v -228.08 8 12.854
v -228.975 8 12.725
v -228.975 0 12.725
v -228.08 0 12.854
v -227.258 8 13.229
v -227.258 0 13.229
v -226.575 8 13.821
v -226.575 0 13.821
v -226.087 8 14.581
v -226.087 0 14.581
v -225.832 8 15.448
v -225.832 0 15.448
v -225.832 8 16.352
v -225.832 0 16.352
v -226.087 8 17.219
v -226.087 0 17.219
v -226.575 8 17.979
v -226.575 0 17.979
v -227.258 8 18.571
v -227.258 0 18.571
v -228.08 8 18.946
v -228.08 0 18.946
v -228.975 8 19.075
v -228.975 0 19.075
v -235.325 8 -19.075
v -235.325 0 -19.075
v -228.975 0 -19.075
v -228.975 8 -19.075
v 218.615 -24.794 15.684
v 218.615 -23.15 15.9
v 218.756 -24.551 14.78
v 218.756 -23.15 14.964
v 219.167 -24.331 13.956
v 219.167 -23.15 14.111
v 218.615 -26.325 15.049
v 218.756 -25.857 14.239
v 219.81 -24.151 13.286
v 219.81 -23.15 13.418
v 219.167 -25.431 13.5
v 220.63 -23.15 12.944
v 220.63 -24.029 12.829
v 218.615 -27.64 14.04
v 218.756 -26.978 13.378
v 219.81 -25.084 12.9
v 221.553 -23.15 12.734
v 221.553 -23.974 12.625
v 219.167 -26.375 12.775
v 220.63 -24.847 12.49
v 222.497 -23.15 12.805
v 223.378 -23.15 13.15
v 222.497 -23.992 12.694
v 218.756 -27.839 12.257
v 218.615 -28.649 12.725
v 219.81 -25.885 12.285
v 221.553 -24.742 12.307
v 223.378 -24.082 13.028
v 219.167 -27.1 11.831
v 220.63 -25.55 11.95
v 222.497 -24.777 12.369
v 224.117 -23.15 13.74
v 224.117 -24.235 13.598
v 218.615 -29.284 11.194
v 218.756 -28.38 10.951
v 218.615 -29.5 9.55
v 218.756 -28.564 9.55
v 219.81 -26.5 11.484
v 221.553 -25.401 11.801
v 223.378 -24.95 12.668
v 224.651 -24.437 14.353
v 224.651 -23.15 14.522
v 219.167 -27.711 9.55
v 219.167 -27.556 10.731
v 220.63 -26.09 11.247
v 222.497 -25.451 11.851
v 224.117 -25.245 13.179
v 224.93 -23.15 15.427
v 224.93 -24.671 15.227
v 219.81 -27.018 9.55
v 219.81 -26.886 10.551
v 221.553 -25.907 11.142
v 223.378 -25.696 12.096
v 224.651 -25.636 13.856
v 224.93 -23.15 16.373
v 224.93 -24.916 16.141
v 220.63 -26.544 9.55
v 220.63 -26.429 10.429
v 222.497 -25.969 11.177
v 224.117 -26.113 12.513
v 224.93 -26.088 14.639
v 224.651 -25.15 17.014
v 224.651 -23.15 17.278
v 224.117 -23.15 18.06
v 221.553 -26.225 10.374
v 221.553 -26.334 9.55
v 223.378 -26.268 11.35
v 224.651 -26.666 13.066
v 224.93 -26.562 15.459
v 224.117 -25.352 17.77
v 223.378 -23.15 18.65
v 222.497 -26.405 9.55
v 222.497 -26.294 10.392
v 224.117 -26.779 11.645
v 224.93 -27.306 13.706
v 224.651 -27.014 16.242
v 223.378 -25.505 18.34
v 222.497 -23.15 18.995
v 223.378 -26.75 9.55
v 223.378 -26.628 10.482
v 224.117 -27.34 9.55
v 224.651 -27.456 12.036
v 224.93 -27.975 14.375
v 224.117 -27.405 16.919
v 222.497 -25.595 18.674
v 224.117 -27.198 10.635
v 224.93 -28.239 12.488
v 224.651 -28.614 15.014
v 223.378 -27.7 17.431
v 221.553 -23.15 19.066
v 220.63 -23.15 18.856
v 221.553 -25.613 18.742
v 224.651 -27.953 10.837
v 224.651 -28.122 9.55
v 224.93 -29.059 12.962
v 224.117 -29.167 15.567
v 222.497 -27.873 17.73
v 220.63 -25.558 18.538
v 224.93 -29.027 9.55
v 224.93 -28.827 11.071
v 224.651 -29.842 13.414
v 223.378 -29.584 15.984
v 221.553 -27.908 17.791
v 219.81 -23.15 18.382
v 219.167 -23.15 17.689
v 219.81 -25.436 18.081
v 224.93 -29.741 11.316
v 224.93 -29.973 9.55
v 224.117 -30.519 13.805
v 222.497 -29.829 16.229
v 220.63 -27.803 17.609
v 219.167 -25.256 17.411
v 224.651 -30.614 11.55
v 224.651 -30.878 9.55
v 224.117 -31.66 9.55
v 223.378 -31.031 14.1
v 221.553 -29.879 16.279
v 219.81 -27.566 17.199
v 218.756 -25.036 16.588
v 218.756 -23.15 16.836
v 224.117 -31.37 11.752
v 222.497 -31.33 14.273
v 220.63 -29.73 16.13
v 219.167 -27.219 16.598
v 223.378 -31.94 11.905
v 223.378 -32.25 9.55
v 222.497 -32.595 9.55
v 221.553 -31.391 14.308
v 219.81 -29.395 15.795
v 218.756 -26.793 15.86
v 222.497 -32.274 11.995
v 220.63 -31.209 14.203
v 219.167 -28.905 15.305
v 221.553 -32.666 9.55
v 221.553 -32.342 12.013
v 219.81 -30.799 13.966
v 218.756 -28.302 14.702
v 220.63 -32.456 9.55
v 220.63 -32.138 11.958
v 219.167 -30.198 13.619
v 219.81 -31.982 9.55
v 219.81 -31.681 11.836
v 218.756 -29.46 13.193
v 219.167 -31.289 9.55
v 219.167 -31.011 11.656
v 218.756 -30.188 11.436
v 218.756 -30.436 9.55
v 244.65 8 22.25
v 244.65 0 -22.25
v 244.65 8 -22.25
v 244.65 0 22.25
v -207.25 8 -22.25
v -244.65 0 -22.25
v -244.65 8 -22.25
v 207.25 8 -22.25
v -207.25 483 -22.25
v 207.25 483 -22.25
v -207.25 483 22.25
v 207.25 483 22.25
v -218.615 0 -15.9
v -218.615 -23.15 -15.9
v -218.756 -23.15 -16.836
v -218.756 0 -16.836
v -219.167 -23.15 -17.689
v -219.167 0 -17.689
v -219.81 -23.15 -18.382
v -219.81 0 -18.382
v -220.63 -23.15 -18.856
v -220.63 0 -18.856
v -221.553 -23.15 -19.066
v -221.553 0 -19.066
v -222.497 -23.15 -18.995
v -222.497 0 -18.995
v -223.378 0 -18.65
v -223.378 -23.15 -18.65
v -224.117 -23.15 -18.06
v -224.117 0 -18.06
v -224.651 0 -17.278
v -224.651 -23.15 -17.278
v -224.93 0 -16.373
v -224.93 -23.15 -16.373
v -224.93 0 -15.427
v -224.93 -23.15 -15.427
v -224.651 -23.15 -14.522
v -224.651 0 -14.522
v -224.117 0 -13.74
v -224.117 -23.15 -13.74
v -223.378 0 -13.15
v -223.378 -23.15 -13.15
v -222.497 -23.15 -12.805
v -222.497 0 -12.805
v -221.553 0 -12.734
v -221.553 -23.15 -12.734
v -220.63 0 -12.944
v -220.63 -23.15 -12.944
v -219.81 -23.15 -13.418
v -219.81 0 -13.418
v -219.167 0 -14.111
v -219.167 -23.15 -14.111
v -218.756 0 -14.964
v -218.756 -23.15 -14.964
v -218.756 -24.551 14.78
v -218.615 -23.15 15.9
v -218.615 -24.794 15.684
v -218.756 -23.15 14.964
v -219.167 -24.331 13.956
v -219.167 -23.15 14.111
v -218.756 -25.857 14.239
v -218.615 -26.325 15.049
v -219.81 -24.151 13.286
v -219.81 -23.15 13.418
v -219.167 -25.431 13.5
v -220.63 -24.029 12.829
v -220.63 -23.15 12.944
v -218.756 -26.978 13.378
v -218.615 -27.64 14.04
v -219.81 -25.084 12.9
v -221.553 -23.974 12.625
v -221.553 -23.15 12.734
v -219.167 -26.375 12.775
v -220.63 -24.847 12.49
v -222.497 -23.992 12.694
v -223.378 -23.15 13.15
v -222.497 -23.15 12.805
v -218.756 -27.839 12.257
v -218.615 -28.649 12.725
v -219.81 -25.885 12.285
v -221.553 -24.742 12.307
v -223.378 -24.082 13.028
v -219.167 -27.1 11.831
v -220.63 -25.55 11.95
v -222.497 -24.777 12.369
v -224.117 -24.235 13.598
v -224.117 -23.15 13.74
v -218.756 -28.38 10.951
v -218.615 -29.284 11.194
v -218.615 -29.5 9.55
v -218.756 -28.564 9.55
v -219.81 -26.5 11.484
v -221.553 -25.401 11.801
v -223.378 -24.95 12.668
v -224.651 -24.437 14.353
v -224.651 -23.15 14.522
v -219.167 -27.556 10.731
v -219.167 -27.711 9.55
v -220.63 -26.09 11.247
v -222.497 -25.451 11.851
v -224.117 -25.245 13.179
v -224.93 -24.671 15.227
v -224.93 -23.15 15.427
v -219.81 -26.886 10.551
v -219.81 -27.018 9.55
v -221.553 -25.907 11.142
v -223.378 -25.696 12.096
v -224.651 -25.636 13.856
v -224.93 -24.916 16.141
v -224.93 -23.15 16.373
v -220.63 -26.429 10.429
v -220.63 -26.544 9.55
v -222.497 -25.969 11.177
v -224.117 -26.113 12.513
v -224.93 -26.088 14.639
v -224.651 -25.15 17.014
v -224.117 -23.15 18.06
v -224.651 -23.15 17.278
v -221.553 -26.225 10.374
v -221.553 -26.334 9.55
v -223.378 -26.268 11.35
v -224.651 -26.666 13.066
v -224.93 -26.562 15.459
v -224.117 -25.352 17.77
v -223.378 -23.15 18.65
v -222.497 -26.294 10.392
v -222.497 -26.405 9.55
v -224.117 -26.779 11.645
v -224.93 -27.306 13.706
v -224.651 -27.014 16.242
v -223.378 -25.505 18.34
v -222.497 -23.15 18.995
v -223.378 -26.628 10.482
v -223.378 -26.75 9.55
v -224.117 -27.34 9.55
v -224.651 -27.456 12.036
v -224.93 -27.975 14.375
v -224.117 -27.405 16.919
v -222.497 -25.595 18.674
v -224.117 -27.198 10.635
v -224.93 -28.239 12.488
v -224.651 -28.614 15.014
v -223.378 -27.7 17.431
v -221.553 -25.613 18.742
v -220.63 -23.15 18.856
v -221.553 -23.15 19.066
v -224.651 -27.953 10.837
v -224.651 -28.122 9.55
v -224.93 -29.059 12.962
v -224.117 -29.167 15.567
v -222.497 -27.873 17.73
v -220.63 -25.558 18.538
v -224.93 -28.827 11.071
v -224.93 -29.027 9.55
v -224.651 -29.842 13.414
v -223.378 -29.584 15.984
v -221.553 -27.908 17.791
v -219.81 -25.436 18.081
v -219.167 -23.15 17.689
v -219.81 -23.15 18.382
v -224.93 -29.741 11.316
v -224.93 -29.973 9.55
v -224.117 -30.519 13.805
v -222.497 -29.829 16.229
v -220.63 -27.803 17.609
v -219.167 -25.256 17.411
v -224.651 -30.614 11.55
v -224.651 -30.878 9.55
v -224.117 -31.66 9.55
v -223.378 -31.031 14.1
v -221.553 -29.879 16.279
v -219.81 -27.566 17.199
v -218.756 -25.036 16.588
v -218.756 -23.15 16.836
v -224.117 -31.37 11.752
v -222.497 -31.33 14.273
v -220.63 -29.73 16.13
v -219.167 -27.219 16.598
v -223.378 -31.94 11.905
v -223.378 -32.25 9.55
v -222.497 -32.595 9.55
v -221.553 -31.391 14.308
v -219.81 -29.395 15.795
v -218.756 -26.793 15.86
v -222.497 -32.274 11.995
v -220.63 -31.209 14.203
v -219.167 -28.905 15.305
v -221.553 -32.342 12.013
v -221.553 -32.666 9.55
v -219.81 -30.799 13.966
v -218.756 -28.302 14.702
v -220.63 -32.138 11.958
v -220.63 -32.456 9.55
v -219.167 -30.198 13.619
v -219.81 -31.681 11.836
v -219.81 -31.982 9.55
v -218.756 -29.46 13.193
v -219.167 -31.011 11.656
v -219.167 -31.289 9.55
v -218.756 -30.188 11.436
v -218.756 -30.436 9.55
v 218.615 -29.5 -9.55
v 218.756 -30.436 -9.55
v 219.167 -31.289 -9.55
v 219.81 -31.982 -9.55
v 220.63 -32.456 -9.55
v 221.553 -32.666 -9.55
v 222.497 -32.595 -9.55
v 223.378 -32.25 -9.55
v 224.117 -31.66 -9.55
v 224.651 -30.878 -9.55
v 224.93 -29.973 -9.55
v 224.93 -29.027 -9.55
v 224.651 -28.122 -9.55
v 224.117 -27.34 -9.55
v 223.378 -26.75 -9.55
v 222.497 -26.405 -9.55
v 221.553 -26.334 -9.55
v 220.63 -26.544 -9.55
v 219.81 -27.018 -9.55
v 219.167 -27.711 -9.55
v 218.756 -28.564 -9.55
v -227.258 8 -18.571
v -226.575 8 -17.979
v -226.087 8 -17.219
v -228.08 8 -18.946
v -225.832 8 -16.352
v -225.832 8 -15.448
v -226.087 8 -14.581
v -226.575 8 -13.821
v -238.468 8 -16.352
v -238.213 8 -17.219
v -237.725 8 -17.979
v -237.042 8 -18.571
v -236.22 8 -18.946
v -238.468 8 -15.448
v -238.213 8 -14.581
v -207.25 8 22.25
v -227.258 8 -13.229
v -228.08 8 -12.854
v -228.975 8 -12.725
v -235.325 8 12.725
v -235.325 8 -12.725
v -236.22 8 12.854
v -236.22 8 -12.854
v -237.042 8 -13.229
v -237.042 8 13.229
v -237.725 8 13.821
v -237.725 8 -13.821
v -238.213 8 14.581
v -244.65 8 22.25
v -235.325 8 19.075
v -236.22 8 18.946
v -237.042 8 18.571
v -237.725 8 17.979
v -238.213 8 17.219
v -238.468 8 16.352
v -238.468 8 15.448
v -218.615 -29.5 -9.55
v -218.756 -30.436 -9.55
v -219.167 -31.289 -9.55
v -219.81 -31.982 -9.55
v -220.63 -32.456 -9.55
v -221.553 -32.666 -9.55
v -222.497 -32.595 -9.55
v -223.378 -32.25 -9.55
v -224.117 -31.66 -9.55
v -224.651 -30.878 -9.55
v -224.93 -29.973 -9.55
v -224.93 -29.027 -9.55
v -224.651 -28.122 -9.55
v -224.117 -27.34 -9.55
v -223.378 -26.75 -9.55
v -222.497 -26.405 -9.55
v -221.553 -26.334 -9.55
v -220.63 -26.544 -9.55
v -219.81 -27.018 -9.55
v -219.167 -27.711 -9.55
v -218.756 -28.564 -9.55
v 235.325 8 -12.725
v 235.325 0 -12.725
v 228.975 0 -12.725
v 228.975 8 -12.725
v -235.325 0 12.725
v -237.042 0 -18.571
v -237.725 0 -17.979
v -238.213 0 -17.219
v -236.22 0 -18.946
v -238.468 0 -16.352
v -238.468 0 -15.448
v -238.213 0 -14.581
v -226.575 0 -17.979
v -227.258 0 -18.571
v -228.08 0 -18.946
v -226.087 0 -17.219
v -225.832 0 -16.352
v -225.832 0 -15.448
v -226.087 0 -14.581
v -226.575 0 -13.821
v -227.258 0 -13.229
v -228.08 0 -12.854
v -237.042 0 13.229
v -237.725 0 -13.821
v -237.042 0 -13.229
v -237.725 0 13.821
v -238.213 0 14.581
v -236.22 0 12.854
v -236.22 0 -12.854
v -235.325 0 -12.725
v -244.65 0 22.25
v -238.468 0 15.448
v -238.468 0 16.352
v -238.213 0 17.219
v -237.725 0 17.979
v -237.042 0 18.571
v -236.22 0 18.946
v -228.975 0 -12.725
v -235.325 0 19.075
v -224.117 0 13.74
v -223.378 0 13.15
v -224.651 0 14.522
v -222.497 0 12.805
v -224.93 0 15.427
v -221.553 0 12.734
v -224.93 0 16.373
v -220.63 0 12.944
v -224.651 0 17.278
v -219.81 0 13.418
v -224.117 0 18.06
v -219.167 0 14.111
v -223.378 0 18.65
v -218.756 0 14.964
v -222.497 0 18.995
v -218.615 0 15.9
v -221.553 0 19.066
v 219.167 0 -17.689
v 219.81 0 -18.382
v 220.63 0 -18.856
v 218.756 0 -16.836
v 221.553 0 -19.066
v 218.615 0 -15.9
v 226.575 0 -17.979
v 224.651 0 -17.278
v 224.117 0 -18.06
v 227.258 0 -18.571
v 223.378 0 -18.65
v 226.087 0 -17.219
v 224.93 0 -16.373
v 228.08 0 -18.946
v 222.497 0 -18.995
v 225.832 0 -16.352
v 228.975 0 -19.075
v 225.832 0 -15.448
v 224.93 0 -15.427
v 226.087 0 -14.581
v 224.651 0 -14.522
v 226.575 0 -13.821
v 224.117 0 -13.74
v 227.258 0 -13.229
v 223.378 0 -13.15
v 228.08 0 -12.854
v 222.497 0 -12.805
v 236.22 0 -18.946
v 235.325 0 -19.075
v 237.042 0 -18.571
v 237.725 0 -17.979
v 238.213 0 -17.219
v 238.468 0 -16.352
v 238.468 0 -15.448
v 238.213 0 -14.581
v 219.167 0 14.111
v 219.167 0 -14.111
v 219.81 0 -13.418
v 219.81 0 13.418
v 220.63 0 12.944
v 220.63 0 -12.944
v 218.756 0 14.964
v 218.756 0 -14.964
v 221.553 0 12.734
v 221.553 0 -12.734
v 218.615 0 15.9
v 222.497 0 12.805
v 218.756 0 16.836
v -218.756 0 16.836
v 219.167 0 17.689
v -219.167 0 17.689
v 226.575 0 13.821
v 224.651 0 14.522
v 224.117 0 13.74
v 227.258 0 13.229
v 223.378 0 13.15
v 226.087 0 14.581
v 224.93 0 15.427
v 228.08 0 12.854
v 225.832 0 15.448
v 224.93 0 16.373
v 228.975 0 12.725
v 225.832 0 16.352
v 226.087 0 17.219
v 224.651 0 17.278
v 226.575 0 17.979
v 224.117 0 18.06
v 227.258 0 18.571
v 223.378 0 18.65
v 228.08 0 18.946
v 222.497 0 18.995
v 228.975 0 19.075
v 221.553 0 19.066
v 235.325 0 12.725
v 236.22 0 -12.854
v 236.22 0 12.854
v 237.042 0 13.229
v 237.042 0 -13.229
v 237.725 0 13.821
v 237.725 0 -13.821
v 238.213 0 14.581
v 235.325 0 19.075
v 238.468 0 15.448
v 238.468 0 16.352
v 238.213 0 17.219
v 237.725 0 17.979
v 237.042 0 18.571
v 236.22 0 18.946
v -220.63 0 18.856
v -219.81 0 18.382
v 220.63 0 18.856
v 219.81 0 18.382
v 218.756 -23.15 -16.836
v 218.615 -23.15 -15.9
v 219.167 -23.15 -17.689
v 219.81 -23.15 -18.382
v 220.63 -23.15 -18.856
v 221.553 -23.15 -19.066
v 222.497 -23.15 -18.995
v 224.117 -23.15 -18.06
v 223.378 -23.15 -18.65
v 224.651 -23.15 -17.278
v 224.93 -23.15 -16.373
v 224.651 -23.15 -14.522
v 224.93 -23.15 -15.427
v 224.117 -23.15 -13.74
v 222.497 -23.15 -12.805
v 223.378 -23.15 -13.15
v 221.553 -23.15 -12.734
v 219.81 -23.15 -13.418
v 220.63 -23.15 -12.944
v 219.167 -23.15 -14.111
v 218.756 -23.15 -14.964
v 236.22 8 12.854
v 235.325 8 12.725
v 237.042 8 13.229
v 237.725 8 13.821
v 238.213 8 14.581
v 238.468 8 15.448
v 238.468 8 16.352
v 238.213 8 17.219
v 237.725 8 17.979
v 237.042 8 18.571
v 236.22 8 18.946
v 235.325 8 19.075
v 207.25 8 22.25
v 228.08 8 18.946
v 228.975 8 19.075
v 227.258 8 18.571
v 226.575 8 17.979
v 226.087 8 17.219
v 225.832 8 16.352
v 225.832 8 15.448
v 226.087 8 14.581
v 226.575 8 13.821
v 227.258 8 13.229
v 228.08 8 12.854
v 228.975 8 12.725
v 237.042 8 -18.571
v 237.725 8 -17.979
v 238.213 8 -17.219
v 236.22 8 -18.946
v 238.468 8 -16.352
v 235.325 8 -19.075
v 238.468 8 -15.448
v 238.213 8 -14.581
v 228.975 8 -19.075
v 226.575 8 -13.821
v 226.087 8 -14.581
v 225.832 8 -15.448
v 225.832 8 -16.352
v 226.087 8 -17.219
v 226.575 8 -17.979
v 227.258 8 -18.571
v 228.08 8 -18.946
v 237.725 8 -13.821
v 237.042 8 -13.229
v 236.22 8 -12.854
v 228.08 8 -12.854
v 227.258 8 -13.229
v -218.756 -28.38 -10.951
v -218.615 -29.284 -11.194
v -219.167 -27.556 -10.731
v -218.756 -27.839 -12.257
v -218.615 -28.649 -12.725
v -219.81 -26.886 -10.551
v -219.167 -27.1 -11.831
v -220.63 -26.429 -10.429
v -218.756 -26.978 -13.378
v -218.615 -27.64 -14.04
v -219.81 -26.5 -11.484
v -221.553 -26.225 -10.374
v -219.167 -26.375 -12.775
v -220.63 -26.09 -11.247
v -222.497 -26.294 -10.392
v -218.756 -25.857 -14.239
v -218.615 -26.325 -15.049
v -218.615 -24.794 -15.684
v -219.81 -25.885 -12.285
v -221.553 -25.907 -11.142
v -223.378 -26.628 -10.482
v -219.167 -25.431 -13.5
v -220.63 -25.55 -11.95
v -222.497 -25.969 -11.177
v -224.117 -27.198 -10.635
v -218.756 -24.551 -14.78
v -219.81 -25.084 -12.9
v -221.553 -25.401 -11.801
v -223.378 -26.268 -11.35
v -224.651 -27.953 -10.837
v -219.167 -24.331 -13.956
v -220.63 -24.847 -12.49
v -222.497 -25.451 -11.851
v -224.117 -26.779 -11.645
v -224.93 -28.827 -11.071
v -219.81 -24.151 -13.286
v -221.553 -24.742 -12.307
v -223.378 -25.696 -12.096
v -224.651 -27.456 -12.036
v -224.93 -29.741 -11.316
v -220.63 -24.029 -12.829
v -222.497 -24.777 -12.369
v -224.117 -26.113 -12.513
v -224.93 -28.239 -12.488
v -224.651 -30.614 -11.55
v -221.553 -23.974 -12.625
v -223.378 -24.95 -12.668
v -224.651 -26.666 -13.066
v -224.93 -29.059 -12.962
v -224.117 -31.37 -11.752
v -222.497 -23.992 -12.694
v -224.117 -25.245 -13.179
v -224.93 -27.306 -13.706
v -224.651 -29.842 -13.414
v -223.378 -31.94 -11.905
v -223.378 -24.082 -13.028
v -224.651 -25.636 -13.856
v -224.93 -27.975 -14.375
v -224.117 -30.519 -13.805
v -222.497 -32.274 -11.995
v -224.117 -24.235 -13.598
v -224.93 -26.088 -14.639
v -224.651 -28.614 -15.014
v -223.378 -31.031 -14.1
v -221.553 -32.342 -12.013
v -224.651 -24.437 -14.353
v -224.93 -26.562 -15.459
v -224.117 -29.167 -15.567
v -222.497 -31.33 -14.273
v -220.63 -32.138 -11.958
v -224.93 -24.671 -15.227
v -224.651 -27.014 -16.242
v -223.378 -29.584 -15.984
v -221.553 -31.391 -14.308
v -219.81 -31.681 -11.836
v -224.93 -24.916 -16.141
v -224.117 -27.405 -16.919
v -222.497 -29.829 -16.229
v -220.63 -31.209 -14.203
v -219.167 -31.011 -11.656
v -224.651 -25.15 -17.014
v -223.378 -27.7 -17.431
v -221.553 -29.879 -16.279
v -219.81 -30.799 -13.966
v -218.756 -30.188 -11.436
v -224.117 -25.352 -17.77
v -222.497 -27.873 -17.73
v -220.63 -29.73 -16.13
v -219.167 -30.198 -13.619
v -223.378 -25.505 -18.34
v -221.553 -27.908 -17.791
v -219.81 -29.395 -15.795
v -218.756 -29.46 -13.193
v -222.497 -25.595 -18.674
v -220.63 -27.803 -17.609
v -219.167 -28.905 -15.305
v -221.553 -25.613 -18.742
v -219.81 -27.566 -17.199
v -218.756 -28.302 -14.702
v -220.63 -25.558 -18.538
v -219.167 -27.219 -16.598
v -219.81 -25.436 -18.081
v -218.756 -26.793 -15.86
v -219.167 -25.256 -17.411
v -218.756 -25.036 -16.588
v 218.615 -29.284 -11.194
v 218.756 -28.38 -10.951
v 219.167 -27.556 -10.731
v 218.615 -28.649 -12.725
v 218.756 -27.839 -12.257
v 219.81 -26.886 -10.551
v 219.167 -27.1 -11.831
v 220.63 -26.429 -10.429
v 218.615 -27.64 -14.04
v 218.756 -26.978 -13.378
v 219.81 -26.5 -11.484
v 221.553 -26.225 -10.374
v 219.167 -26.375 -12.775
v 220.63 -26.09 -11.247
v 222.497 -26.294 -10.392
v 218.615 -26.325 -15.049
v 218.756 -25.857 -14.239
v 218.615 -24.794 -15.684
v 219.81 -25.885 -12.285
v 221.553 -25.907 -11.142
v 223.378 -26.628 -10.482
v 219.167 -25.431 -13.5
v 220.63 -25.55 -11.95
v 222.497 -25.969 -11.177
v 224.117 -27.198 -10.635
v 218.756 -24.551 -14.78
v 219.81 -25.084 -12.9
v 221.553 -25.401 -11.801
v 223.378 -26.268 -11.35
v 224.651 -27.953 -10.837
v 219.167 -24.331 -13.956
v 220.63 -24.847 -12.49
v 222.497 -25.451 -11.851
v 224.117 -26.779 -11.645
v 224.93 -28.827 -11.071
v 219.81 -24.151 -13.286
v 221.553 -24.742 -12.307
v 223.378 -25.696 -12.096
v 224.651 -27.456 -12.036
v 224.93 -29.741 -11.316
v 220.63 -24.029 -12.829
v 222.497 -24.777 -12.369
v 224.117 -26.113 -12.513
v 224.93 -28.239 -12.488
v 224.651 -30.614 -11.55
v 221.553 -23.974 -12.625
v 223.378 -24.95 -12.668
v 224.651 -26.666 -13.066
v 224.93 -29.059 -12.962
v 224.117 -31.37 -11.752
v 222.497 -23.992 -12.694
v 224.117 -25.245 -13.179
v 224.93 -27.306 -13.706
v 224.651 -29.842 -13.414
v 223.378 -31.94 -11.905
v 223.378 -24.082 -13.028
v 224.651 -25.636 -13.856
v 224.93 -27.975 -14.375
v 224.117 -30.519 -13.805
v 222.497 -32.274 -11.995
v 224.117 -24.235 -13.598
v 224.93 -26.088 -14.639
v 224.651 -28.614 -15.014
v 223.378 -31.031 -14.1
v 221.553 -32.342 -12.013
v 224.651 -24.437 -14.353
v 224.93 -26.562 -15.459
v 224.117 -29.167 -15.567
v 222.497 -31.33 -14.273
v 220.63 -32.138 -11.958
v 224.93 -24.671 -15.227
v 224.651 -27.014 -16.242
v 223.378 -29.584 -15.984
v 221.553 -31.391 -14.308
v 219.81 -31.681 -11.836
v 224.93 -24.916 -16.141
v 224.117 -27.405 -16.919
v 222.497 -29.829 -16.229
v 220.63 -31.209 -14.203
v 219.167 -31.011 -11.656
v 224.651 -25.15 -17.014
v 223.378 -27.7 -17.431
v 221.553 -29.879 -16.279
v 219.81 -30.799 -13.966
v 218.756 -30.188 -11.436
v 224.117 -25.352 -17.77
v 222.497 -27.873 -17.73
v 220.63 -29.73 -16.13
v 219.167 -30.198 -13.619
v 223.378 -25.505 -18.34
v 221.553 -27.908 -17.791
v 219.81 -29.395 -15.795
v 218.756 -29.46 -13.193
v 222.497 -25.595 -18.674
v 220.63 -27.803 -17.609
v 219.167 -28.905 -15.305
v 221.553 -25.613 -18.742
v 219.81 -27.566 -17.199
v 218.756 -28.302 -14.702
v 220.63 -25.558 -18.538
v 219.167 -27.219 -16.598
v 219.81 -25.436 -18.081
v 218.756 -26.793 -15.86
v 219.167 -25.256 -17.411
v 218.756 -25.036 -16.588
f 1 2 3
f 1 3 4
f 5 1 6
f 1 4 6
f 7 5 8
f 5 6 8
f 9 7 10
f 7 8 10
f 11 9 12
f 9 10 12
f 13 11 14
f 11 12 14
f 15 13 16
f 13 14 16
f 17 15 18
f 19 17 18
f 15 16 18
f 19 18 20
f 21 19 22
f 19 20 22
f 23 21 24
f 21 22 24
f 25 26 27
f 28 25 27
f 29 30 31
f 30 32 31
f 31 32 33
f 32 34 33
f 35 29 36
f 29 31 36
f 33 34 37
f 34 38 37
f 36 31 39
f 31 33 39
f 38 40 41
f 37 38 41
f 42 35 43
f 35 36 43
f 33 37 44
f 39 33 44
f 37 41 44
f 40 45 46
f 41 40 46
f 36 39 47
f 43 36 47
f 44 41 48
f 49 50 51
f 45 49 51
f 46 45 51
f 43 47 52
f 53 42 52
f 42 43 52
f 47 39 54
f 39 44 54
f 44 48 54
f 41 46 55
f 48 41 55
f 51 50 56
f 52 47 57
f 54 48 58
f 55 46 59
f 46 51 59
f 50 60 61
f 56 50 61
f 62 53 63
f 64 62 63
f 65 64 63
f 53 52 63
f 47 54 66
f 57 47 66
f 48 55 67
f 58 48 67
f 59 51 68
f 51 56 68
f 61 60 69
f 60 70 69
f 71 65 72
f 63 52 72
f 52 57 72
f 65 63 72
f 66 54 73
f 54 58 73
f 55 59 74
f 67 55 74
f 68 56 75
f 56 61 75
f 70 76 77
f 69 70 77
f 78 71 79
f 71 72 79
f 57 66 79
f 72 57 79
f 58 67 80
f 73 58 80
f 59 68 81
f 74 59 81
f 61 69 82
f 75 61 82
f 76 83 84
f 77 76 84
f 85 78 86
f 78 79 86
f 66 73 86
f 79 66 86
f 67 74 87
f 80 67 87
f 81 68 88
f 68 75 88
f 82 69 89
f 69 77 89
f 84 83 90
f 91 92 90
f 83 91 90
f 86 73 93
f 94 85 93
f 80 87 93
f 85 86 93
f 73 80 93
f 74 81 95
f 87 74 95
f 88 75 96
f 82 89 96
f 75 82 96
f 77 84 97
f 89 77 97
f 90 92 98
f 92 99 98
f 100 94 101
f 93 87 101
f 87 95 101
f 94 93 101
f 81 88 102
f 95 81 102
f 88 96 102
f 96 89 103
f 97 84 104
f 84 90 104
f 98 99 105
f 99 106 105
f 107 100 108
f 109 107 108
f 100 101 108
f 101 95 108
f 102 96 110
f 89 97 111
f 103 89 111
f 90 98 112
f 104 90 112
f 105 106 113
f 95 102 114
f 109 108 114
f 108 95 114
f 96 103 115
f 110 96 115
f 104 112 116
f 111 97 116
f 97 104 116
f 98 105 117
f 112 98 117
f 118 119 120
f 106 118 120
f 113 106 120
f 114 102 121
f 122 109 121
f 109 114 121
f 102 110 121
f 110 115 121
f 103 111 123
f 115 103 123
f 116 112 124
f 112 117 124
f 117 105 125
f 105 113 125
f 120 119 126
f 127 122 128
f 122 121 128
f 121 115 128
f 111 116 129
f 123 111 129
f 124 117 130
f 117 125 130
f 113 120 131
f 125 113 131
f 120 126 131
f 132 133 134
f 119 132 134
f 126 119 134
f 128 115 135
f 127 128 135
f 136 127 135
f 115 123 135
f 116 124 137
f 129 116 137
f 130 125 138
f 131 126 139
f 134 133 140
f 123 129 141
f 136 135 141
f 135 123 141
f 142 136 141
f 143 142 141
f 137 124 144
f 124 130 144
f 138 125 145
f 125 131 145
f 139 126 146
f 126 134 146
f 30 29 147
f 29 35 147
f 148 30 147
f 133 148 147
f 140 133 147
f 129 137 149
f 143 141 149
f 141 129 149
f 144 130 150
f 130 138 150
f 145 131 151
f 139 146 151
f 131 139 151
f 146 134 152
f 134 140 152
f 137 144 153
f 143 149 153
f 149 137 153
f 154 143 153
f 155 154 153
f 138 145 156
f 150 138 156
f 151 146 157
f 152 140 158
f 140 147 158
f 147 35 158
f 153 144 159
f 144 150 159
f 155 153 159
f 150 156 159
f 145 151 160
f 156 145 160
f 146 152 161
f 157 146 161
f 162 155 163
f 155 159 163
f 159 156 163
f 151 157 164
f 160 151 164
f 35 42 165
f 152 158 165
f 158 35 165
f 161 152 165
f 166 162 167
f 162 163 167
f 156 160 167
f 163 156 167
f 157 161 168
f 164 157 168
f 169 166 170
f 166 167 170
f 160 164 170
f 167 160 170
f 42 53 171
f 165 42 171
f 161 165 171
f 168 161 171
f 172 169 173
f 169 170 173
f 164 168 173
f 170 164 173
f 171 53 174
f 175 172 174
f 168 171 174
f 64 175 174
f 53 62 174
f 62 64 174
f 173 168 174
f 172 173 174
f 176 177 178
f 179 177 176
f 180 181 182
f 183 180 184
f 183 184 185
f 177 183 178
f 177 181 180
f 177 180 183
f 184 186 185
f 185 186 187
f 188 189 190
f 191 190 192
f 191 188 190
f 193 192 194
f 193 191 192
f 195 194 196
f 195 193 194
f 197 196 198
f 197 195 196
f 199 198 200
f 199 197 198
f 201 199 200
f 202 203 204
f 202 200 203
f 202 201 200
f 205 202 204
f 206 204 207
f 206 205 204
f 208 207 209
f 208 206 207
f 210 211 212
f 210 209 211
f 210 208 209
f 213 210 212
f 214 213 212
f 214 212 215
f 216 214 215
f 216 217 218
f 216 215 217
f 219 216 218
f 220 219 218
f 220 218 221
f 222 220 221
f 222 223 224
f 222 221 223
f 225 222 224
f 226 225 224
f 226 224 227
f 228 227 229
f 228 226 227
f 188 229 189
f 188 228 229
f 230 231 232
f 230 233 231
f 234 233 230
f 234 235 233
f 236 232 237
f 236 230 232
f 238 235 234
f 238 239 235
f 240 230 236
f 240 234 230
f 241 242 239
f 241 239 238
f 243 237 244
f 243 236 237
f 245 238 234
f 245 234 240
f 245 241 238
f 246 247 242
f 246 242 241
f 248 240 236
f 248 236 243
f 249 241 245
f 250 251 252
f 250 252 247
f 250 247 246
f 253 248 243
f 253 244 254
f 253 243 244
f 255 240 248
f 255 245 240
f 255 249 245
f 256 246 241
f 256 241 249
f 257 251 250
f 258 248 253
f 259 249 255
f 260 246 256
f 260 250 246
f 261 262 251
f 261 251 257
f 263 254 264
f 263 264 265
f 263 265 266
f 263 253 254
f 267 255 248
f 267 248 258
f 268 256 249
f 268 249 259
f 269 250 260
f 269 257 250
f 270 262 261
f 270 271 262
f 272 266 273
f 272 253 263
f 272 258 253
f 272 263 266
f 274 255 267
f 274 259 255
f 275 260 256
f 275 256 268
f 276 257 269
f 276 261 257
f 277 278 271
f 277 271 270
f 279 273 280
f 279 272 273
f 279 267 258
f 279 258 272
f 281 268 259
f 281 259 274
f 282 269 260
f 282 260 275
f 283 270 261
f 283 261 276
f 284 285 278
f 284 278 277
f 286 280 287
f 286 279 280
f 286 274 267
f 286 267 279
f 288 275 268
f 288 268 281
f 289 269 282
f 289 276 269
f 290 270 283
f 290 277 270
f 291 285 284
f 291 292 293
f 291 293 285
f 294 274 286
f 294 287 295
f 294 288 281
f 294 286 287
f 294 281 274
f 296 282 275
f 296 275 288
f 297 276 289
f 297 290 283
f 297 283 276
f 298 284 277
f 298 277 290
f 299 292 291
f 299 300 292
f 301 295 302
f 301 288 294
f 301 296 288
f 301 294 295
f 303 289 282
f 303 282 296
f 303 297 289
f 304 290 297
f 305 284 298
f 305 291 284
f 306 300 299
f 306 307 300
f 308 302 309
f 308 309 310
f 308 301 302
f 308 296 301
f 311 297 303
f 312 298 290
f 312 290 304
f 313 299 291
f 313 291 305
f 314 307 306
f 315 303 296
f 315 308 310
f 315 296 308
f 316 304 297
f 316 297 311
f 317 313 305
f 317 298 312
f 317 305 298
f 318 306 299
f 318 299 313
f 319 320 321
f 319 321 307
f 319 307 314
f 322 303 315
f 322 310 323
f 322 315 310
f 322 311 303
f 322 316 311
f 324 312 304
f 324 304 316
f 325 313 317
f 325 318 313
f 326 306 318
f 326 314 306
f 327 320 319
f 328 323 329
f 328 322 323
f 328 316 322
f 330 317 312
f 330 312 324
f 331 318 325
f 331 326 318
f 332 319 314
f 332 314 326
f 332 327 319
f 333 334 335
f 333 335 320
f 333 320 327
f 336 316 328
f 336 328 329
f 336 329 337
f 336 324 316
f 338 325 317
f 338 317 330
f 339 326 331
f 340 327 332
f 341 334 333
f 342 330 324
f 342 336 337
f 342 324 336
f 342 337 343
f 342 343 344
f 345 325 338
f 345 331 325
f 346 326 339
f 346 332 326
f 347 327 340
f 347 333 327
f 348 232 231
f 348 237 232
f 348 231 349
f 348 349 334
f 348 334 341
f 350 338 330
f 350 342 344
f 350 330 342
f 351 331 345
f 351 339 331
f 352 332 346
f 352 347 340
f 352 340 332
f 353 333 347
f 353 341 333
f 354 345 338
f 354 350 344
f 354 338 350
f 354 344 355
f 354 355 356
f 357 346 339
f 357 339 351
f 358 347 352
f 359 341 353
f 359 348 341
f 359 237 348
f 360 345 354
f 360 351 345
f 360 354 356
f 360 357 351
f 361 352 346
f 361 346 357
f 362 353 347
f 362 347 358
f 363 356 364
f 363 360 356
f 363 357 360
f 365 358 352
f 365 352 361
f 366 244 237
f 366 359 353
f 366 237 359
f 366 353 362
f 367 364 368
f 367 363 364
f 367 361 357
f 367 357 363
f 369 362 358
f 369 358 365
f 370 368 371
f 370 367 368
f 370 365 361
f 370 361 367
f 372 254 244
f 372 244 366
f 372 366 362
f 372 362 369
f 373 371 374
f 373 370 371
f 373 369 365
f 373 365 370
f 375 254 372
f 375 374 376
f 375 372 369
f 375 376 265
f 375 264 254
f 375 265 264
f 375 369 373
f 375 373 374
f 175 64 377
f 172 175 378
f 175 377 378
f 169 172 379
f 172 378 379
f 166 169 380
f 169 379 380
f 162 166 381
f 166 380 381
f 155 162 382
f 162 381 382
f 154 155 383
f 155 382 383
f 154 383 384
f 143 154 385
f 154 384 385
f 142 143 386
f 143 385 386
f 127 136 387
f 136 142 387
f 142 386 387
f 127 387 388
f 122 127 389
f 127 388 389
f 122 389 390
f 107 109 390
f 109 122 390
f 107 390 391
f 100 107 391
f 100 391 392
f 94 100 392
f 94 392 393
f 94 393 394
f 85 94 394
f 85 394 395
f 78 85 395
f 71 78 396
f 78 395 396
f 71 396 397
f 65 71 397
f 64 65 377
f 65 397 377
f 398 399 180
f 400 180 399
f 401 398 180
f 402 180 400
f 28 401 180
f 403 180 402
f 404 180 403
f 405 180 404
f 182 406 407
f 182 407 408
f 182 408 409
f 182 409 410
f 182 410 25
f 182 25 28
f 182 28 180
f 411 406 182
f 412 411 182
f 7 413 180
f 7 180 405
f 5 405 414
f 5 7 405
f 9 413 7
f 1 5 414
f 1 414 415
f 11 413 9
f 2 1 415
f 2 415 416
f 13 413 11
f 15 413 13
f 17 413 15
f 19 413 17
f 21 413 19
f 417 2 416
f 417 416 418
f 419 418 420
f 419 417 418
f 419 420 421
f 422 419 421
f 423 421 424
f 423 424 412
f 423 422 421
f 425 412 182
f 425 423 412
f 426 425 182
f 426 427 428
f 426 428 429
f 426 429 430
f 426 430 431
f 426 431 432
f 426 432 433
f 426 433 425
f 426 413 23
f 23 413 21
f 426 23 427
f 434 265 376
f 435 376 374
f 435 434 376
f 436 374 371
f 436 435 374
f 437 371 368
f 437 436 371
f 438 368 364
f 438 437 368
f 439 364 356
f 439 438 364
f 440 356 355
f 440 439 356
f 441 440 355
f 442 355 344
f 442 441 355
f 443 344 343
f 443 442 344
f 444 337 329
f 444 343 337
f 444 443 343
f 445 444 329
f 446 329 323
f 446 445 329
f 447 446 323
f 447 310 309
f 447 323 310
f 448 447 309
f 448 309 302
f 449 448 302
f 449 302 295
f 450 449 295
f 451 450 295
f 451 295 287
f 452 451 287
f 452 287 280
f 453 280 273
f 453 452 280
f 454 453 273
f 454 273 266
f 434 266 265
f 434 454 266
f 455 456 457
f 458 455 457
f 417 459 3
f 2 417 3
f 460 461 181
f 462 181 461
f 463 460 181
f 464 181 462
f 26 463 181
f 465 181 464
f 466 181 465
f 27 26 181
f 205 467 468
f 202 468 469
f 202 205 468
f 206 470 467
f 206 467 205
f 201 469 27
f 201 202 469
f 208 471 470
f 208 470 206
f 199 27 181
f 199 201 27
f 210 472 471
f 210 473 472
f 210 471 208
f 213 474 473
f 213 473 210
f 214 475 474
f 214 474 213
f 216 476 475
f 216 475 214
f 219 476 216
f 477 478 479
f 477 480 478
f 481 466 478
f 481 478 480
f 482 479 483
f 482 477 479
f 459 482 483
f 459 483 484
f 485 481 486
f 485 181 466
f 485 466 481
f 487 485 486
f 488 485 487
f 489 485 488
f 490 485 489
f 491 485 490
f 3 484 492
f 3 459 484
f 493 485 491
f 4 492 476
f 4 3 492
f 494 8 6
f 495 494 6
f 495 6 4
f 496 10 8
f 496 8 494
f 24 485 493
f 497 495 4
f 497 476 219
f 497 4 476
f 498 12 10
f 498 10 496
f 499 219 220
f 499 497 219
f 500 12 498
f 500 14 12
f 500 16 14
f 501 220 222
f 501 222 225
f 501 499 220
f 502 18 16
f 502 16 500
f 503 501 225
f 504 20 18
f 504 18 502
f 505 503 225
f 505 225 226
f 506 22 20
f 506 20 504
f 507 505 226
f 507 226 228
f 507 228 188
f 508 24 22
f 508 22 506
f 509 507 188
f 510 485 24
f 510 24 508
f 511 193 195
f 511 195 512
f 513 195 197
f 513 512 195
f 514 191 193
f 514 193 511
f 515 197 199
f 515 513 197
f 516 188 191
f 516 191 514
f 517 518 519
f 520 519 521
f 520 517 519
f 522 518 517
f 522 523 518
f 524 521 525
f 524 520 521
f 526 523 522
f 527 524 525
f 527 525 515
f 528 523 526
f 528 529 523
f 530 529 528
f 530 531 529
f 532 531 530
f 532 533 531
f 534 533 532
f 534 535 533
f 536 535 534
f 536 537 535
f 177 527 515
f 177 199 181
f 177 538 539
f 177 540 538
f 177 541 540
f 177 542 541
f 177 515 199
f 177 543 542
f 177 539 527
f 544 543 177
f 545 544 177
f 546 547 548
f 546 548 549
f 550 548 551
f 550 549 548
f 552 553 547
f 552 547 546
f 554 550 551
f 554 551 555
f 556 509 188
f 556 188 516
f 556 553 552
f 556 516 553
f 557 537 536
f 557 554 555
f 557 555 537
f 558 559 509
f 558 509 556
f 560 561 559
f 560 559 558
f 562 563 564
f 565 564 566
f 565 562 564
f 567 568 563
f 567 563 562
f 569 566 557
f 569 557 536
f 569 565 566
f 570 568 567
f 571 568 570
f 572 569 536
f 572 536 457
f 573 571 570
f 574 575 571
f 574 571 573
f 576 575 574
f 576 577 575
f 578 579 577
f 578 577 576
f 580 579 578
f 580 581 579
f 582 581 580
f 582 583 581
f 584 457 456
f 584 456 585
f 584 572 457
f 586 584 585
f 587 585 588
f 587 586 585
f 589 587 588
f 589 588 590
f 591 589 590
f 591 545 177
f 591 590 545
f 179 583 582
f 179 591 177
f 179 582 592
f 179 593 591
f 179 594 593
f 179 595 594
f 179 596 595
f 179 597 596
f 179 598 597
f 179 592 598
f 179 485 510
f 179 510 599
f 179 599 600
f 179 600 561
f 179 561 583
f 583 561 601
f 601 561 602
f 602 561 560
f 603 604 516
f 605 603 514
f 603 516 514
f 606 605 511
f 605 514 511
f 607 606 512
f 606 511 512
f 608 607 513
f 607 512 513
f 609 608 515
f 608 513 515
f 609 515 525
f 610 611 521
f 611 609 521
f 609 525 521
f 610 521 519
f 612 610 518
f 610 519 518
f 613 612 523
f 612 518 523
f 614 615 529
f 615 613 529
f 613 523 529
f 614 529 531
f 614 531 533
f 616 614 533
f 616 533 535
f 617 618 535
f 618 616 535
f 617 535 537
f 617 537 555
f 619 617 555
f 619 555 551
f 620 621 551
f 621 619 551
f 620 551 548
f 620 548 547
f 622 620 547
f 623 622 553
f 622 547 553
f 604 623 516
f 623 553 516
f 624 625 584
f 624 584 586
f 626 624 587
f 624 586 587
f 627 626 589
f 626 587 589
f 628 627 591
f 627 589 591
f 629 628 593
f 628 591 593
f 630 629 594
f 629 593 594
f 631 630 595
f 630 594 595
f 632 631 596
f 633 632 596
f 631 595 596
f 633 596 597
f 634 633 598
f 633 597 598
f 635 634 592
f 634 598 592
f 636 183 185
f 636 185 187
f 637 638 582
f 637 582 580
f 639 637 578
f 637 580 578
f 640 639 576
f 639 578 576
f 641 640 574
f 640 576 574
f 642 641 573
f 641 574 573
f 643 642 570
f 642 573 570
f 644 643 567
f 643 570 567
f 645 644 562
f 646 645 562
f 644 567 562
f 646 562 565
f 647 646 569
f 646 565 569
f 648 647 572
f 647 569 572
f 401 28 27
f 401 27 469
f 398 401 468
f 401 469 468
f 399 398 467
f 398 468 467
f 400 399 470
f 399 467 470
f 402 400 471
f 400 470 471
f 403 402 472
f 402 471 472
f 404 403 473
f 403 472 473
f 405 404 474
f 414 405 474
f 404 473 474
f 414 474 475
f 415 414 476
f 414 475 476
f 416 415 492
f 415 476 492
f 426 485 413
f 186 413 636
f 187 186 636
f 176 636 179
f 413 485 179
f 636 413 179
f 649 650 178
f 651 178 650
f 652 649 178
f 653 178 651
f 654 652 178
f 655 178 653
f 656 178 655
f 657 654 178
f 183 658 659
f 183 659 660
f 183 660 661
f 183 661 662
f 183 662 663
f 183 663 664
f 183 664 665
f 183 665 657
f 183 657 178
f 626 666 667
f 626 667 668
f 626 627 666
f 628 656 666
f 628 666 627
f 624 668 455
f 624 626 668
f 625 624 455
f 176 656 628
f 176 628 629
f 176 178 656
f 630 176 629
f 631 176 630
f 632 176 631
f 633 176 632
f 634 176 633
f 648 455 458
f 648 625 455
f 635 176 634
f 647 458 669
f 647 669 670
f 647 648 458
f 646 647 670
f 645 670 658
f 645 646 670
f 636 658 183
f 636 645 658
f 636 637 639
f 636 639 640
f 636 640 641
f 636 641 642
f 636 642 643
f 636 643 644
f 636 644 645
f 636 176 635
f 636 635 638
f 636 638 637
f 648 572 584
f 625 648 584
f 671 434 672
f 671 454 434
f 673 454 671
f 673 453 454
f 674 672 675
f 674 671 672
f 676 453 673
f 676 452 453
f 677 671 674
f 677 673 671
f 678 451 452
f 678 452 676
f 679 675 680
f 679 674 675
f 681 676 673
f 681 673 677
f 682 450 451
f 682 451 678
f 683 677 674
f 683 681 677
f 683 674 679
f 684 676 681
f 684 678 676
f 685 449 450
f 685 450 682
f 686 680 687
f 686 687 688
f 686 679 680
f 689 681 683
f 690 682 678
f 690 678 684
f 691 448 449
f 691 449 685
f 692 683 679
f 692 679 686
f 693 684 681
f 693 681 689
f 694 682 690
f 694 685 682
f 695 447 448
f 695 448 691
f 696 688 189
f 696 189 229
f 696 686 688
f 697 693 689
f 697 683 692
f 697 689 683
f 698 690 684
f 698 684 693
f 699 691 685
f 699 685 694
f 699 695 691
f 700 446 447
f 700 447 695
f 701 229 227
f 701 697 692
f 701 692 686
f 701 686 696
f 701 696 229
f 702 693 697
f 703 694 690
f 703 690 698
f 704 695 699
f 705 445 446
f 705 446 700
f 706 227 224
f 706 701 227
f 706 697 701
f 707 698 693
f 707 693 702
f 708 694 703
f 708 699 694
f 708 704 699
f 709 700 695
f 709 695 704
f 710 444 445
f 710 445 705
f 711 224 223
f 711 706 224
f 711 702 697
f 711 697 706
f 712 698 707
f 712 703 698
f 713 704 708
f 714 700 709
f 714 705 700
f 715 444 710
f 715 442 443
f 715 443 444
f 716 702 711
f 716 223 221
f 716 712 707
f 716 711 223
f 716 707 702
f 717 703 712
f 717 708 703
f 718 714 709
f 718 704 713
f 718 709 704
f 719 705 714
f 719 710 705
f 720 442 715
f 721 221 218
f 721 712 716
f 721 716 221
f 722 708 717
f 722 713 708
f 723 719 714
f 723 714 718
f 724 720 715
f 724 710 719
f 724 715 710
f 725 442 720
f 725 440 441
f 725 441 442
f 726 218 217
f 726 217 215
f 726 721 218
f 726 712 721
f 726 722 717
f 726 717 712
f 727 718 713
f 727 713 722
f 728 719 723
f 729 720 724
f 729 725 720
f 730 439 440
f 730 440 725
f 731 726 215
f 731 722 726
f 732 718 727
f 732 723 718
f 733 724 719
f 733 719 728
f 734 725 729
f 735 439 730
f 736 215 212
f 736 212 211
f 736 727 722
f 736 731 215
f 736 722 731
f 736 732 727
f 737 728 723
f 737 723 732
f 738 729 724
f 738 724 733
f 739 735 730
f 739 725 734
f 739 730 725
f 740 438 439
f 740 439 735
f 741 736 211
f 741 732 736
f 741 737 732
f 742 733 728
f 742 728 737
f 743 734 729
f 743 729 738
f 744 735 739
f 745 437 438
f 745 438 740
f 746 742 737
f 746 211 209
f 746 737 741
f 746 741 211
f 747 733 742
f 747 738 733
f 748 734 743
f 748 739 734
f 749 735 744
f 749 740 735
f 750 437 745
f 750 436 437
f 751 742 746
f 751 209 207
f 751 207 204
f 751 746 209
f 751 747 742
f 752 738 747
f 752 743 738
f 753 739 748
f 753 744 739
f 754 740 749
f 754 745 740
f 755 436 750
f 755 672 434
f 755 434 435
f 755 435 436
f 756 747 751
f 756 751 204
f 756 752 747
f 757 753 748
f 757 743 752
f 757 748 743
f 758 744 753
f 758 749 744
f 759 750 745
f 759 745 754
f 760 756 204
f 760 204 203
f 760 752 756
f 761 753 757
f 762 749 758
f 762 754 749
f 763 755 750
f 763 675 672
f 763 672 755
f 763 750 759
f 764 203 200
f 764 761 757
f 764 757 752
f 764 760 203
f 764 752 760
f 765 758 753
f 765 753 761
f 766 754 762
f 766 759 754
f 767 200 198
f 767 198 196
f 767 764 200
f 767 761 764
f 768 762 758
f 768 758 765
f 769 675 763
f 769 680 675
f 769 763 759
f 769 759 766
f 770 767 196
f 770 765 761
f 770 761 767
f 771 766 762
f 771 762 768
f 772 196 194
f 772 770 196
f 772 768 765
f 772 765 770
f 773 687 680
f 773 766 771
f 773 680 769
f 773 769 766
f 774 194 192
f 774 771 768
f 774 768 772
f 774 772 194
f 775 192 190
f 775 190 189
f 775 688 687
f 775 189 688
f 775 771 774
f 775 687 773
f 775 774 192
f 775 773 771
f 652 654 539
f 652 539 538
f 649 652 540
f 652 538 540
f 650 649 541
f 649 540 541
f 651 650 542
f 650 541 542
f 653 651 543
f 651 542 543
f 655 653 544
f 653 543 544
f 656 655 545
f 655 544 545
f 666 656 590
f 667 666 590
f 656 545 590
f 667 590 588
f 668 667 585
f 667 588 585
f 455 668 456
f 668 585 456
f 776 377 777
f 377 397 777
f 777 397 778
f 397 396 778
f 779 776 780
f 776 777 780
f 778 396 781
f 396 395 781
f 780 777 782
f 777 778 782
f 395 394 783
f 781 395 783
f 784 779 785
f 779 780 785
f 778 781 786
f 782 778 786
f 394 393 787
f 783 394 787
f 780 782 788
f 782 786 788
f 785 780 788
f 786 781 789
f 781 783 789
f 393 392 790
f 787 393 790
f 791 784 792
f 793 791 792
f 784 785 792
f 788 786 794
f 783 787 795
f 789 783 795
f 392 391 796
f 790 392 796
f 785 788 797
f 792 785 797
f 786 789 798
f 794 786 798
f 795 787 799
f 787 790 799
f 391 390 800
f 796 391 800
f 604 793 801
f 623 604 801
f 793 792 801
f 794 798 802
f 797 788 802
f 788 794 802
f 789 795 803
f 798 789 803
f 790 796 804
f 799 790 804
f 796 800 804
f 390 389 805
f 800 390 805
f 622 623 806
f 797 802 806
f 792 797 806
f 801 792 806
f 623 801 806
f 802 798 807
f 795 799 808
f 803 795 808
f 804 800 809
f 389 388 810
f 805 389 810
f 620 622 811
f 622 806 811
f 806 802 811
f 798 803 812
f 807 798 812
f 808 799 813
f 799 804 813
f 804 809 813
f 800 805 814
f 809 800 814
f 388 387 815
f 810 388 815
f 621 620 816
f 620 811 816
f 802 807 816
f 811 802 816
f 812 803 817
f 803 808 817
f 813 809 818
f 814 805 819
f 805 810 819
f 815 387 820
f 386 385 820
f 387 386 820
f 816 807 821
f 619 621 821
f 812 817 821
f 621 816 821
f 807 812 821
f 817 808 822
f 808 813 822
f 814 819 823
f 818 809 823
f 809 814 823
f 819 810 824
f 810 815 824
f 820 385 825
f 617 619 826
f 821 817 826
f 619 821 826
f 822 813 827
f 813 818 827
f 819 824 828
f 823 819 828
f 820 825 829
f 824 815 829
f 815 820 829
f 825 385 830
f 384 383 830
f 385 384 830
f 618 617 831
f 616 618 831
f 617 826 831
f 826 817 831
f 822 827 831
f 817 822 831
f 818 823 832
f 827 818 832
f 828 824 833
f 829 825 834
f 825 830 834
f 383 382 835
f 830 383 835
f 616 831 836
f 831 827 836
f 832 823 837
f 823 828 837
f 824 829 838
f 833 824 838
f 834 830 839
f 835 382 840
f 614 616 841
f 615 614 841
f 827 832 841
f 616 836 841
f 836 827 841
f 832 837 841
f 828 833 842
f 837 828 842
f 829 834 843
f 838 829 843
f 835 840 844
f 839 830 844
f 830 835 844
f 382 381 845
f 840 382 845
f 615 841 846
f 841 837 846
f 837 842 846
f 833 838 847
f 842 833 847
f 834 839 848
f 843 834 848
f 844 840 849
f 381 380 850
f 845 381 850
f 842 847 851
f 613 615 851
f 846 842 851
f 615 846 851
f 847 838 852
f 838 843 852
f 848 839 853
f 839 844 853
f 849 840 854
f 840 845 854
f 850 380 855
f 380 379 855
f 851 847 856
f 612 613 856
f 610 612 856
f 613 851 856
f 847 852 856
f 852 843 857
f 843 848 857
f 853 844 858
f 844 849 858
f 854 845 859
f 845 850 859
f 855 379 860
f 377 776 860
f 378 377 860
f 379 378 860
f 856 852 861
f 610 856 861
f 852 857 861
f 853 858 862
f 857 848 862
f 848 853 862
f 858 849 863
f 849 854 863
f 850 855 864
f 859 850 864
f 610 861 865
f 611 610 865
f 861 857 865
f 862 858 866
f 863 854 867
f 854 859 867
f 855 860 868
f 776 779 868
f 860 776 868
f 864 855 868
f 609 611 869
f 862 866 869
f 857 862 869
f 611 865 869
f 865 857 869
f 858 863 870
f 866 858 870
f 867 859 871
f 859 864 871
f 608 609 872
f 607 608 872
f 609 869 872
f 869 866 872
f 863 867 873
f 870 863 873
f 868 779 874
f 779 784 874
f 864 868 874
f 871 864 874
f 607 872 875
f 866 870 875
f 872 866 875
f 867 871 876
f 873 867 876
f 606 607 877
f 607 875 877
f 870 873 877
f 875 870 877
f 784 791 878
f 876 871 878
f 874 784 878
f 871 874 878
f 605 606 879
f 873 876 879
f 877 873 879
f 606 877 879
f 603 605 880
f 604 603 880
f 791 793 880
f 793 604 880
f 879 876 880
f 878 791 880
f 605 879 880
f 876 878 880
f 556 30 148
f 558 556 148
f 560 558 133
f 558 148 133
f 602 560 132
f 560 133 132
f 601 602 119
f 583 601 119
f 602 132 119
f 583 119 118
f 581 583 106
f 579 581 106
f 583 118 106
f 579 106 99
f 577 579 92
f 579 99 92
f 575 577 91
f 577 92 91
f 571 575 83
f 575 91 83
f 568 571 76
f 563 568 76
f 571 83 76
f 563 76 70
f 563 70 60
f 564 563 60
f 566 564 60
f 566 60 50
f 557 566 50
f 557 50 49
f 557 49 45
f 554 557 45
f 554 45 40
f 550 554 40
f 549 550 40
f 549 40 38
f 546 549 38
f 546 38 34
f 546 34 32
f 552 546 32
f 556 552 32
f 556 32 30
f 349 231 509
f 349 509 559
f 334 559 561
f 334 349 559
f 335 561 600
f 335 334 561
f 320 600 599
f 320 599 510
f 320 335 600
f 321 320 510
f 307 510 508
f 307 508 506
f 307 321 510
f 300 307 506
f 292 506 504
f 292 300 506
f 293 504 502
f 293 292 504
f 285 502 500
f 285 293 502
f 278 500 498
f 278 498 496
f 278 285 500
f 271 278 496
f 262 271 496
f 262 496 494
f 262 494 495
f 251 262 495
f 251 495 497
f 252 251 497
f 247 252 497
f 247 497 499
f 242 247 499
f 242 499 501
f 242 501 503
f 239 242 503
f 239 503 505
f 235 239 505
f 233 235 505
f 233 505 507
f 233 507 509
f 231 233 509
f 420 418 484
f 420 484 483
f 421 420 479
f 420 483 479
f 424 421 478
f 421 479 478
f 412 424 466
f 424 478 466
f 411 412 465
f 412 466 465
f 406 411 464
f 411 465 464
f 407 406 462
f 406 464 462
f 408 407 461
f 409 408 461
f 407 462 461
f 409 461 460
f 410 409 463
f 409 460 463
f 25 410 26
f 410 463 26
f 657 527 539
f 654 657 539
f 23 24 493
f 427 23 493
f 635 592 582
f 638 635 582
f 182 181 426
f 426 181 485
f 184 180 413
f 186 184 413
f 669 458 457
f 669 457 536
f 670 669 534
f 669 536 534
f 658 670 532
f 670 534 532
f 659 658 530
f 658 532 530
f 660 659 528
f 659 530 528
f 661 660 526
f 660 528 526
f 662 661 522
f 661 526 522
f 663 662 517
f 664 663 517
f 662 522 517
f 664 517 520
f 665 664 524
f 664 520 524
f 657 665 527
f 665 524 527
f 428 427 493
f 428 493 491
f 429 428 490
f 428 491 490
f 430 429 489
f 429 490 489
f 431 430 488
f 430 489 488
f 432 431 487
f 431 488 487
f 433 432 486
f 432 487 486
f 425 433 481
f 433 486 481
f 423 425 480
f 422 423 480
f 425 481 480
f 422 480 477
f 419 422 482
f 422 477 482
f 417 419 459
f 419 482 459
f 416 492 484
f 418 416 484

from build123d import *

# Parameters (mm, degrees)
F0_W     = 489.3
F0_H     = 44.5
F1_DEPTH = 483
F2_W     = 37.4
F2_H     = 44.5
F3_DEPTH = 475
F5_DEPTH = 8
F8_R     = 3.175


with BuildPart() as f1:
    # F0 (on Front) → F1 (new body)
    with BuildSketch(Plane.XZ):
        Rectangle(F0_W, F0_H)
    extrude(amount=-F1_DEPTH)

    # F2 (on face) → F3 (cut)
    with BuildSketch(Plane(origin=(0, 483, 0), x_dir=(-1, 0, 0), z_dir=(0, 1, 0))):
        with Locations((-225.95, 0)):
            Rectangle(F2_W, F2_H)
        with Locations((225.95, 0)):
            Rectangle(F2_W, F2_H)
    extrude(amount=-F3_DEPTH, mode=Mode.SUBTRACT)

    # F4 (on face) → F5 (cut, through all)
    with BuildSketch(Plane.XZ):
        with BuildLine():
            Line((-235.325, 12.725), (-228.975, 12.725))
            ThreePointArc((-228.975, 12.725), (-225.8, 15.9), (-228.975, 19.075))
            Line((-228.975, 19.075), (-235.325, 19.075))
            ThreePointArc((-235.325, 19.075), (-238.5, 15.9), (-235.325, 12.725))
        make_face()
        with BuildLine():
            Line((-228.975, -12.725), (-235.325, -12.725))
            ThreePointArc((-235.325, -12.725), (-238.5, -15.9), (-235.325, -19.075))
            Line((-235.325, -19.075), (-228.975, -19.075))
            ThreePointArc((-228.975, -19.075), (-225.8, -15.9), (-228.975, -12.725))
        make_face()
        with BuildLine():
            Line((235.325, 19.075), (228.975, 19.075))
            ThreePointArc((228.975, 19.075), (225.8, 15.9), (228.975, 12.725))
            Line((228.975, 12.725), (235.325, 12.725))
            ThreePointArc((235.325, 12.725), (238.5, 15.9), (235.325, 19.075))
        make_face()
        with BuildLine():
            Line((235.325, -12.725), (228.975, -12.725))
            ThreePointArc((228.975, -12.725), (225.8, -15.9), (228.975, -19.075))
            Line((228.975, -19.075), (235.325, -19.075))
            ThreePointArc((235.325, -19.075), (238.5, -15.9), (235.325, -12.725))
        make_face()
    extrude(amount=-F5_DEPTH, mode=Mode.SUBTRACT)

    # F9: sweep along a path in F7
    with BuildLine(Plane.YZ.offset(-228.6)) as f9_path:
        Line((0, 15.9), (-23.15, 15.9))
        ThreePointArc((-23.15, 15.9), (-27.6401280605, 14.0401280605), (-29.5, 9.55))
        Line((-29.5, 9.55), (-29.5, -9.55))
        ThreePointArc((-29.5, -9.55), (-27.6401280605, -14.0401280605), (-23.15, -15.9))
        Line((-23.15, -15.9), (0, -15.9))
    # F8 (on face) → F9 (sweep)
    with BuildSketch(Plane.XZ):
        with Locations((-221.79, 15.9)):
            Circle(F8_R)
    sweep(path=f9_path.line)

    # F10: F1 across plane


with BuildPart() as f1_1:
    add(f1.part)
    add(f1.part.mirror(Plane.YZ))


solid = f1_1.part
